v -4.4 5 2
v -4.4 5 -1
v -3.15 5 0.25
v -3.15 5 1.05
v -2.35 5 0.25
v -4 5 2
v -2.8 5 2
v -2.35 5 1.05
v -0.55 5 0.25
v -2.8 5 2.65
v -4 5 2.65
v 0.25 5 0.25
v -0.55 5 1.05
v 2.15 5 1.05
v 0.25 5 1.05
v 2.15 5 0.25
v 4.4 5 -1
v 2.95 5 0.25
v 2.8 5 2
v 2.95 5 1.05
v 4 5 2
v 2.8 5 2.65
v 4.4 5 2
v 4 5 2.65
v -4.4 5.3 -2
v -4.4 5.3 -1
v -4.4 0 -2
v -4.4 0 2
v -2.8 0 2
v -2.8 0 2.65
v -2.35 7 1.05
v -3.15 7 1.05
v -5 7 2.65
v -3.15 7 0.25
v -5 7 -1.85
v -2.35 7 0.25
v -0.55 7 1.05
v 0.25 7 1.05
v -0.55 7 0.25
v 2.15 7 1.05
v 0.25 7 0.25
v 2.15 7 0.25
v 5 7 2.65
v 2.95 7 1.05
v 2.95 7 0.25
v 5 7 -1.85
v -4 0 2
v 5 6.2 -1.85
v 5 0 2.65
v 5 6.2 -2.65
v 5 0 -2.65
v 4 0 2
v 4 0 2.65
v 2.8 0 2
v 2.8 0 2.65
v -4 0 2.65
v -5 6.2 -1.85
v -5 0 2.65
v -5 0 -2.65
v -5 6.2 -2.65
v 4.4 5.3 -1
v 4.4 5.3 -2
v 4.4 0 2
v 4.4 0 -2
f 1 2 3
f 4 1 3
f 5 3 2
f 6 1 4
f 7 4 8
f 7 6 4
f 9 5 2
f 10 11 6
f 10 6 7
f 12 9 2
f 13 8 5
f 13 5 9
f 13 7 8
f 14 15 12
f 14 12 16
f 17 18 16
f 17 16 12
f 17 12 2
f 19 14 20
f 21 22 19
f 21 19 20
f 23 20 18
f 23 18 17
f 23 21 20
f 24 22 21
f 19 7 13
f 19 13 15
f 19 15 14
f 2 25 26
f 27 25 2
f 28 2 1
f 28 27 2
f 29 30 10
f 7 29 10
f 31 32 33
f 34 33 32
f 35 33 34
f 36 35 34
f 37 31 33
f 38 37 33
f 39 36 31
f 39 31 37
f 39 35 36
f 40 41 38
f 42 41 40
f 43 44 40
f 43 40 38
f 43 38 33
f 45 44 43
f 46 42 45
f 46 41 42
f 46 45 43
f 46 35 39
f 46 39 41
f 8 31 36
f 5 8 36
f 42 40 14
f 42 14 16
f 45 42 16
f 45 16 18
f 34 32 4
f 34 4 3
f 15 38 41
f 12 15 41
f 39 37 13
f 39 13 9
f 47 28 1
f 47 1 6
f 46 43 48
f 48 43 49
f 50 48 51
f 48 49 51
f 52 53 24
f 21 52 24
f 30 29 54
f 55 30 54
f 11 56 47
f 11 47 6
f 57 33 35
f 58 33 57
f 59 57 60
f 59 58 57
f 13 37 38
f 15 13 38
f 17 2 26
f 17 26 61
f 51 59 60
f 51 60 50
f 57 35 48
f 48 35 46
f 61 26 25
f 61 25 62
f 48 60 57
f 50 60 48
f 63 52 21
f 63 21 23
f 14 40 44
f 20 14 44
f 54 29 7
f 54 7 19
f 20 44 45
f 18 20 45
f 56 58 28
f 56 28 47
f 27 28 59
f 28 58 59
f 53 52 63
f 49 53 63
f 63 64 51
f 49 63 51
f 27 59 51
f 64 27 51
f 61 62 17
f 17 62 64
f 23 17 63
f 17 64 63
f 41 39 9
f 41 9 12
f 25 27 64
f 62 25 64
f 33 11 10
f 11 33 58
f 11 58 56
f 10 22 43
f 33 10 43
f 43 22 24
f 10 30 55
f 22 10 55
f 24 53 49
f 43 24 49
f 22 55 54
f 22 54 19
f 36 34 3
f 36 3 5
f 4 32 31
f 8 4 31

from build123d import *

# Parameters (mm, degrees)
SKETCH1_W           = 10
SKETCH1_H           = 5.3
BOSS_EXTRUDE1_DEPTH = 7
SKETCH3_W           = 8.8
SKETCH3_H           = 4
CUT_EXTRUDE1_DEPTH  = 5
SKETCH4_W           = 1.2
SKETCH4_H           = 5
CUT_EXTRUDE2_DEPTH  = 4
SKETCH5_W           = 10
SKETCH5_H           = 0.8
CUT_EXTRUDE3_DEPTH  = 0.8
SKETCH6_W           = 0.8
SKETCH6_H           = 0.8
CUT_EXTRUDE4_DEPTH  = 10
SKETCH7_W           = 8.8
SKETCH7_H           = 1
CUT_EXTRUDE5_DEPTH  = 0.3


with BuildPart() as part:
    # Sketch1 → Boss-Extrude1 (new body)
    with BuildSketch(Plane(origin=(0, 0, 0), x_dir=(1, 0, 0), z_dir=(0, 1, 0))):
        Rectangle(SKETCH1_W, SKETCH1_H)
    extrude(amount=BOSS_EXTRUDE1_DEPTH)

    # Sketch3 → Cut-Extrude1 (cut)
    with BuildSketch(Plane.XZ):
        Rectangle(SKETCH3_W, SKETCH3_H)
    extrude(amount=-CUT_EXTRUDE1_DEPTH, mode=Mode.SUBTRACT)

    # Sketch4 → Cut-Extrude2 (cut)
    with BuildSketch(Plane.XY.offset(2.65)):
        with Locations((-3.4, 2.5)):
            Rectangle(SKETCH4_W, SKETCH4_H)
        with Locations((3.4, 2.5)):
            Rectangle(SKETCH4_W, SKETCH4_H)
    extrude(amount=-CUT_EXTRUDE2_DEPTH, mode=Mode.SUBTRACT)

    # Sketch5 → Cut-Extrude3 (cut)
    with BuildSketch(Plane(origin=(0, 7, 0), x_dir=(1, 0, 0), z_dir=(0, 1, 0))):
        with Locations((0, 2.25)):
            Rectangle(SKETCH5_W, SKETCH5_H)
    extrude(amount=-CUT_EXTRUDE3_DEPTH, mode=Mode.SUBTRACT)

    # Sketch6 → Cut-Extrude4 (cut)
    with BuildSketch(Plane(origin=(0, 7, 0), x_dir=(1, 0, 0), z_dir=(0, 1, 0))):
        with Locations((2.55, -0.65)):
            Rectangle(SKETCH6_W, SKETCH6_H)
        with Locations((-0.15, -0.65)):
            Rectangle(SKETCH6_W, SKETCH6_H)
        with Locations((-2.75, -0.65)):
            Rectangle(SKETCH6_W, SKETCH6_H)
    extrude(amount=-CUT_EXTRUDE4_DEPTH, mode=Mode.SUBTRACT)

    # Sketch7 → Cut-Extrude5 (cut)
    with BuildSketch(Plane.XZ.offset(-5)):
        with Locations((0, -1.5)):
            Rectangle(SKETCH7_W, SKETCH7_H)
    extrude(amount=-CUT_EXTRUDE5_DEPTH, mode=Mode.SUBTRACT)


solid = part.part
